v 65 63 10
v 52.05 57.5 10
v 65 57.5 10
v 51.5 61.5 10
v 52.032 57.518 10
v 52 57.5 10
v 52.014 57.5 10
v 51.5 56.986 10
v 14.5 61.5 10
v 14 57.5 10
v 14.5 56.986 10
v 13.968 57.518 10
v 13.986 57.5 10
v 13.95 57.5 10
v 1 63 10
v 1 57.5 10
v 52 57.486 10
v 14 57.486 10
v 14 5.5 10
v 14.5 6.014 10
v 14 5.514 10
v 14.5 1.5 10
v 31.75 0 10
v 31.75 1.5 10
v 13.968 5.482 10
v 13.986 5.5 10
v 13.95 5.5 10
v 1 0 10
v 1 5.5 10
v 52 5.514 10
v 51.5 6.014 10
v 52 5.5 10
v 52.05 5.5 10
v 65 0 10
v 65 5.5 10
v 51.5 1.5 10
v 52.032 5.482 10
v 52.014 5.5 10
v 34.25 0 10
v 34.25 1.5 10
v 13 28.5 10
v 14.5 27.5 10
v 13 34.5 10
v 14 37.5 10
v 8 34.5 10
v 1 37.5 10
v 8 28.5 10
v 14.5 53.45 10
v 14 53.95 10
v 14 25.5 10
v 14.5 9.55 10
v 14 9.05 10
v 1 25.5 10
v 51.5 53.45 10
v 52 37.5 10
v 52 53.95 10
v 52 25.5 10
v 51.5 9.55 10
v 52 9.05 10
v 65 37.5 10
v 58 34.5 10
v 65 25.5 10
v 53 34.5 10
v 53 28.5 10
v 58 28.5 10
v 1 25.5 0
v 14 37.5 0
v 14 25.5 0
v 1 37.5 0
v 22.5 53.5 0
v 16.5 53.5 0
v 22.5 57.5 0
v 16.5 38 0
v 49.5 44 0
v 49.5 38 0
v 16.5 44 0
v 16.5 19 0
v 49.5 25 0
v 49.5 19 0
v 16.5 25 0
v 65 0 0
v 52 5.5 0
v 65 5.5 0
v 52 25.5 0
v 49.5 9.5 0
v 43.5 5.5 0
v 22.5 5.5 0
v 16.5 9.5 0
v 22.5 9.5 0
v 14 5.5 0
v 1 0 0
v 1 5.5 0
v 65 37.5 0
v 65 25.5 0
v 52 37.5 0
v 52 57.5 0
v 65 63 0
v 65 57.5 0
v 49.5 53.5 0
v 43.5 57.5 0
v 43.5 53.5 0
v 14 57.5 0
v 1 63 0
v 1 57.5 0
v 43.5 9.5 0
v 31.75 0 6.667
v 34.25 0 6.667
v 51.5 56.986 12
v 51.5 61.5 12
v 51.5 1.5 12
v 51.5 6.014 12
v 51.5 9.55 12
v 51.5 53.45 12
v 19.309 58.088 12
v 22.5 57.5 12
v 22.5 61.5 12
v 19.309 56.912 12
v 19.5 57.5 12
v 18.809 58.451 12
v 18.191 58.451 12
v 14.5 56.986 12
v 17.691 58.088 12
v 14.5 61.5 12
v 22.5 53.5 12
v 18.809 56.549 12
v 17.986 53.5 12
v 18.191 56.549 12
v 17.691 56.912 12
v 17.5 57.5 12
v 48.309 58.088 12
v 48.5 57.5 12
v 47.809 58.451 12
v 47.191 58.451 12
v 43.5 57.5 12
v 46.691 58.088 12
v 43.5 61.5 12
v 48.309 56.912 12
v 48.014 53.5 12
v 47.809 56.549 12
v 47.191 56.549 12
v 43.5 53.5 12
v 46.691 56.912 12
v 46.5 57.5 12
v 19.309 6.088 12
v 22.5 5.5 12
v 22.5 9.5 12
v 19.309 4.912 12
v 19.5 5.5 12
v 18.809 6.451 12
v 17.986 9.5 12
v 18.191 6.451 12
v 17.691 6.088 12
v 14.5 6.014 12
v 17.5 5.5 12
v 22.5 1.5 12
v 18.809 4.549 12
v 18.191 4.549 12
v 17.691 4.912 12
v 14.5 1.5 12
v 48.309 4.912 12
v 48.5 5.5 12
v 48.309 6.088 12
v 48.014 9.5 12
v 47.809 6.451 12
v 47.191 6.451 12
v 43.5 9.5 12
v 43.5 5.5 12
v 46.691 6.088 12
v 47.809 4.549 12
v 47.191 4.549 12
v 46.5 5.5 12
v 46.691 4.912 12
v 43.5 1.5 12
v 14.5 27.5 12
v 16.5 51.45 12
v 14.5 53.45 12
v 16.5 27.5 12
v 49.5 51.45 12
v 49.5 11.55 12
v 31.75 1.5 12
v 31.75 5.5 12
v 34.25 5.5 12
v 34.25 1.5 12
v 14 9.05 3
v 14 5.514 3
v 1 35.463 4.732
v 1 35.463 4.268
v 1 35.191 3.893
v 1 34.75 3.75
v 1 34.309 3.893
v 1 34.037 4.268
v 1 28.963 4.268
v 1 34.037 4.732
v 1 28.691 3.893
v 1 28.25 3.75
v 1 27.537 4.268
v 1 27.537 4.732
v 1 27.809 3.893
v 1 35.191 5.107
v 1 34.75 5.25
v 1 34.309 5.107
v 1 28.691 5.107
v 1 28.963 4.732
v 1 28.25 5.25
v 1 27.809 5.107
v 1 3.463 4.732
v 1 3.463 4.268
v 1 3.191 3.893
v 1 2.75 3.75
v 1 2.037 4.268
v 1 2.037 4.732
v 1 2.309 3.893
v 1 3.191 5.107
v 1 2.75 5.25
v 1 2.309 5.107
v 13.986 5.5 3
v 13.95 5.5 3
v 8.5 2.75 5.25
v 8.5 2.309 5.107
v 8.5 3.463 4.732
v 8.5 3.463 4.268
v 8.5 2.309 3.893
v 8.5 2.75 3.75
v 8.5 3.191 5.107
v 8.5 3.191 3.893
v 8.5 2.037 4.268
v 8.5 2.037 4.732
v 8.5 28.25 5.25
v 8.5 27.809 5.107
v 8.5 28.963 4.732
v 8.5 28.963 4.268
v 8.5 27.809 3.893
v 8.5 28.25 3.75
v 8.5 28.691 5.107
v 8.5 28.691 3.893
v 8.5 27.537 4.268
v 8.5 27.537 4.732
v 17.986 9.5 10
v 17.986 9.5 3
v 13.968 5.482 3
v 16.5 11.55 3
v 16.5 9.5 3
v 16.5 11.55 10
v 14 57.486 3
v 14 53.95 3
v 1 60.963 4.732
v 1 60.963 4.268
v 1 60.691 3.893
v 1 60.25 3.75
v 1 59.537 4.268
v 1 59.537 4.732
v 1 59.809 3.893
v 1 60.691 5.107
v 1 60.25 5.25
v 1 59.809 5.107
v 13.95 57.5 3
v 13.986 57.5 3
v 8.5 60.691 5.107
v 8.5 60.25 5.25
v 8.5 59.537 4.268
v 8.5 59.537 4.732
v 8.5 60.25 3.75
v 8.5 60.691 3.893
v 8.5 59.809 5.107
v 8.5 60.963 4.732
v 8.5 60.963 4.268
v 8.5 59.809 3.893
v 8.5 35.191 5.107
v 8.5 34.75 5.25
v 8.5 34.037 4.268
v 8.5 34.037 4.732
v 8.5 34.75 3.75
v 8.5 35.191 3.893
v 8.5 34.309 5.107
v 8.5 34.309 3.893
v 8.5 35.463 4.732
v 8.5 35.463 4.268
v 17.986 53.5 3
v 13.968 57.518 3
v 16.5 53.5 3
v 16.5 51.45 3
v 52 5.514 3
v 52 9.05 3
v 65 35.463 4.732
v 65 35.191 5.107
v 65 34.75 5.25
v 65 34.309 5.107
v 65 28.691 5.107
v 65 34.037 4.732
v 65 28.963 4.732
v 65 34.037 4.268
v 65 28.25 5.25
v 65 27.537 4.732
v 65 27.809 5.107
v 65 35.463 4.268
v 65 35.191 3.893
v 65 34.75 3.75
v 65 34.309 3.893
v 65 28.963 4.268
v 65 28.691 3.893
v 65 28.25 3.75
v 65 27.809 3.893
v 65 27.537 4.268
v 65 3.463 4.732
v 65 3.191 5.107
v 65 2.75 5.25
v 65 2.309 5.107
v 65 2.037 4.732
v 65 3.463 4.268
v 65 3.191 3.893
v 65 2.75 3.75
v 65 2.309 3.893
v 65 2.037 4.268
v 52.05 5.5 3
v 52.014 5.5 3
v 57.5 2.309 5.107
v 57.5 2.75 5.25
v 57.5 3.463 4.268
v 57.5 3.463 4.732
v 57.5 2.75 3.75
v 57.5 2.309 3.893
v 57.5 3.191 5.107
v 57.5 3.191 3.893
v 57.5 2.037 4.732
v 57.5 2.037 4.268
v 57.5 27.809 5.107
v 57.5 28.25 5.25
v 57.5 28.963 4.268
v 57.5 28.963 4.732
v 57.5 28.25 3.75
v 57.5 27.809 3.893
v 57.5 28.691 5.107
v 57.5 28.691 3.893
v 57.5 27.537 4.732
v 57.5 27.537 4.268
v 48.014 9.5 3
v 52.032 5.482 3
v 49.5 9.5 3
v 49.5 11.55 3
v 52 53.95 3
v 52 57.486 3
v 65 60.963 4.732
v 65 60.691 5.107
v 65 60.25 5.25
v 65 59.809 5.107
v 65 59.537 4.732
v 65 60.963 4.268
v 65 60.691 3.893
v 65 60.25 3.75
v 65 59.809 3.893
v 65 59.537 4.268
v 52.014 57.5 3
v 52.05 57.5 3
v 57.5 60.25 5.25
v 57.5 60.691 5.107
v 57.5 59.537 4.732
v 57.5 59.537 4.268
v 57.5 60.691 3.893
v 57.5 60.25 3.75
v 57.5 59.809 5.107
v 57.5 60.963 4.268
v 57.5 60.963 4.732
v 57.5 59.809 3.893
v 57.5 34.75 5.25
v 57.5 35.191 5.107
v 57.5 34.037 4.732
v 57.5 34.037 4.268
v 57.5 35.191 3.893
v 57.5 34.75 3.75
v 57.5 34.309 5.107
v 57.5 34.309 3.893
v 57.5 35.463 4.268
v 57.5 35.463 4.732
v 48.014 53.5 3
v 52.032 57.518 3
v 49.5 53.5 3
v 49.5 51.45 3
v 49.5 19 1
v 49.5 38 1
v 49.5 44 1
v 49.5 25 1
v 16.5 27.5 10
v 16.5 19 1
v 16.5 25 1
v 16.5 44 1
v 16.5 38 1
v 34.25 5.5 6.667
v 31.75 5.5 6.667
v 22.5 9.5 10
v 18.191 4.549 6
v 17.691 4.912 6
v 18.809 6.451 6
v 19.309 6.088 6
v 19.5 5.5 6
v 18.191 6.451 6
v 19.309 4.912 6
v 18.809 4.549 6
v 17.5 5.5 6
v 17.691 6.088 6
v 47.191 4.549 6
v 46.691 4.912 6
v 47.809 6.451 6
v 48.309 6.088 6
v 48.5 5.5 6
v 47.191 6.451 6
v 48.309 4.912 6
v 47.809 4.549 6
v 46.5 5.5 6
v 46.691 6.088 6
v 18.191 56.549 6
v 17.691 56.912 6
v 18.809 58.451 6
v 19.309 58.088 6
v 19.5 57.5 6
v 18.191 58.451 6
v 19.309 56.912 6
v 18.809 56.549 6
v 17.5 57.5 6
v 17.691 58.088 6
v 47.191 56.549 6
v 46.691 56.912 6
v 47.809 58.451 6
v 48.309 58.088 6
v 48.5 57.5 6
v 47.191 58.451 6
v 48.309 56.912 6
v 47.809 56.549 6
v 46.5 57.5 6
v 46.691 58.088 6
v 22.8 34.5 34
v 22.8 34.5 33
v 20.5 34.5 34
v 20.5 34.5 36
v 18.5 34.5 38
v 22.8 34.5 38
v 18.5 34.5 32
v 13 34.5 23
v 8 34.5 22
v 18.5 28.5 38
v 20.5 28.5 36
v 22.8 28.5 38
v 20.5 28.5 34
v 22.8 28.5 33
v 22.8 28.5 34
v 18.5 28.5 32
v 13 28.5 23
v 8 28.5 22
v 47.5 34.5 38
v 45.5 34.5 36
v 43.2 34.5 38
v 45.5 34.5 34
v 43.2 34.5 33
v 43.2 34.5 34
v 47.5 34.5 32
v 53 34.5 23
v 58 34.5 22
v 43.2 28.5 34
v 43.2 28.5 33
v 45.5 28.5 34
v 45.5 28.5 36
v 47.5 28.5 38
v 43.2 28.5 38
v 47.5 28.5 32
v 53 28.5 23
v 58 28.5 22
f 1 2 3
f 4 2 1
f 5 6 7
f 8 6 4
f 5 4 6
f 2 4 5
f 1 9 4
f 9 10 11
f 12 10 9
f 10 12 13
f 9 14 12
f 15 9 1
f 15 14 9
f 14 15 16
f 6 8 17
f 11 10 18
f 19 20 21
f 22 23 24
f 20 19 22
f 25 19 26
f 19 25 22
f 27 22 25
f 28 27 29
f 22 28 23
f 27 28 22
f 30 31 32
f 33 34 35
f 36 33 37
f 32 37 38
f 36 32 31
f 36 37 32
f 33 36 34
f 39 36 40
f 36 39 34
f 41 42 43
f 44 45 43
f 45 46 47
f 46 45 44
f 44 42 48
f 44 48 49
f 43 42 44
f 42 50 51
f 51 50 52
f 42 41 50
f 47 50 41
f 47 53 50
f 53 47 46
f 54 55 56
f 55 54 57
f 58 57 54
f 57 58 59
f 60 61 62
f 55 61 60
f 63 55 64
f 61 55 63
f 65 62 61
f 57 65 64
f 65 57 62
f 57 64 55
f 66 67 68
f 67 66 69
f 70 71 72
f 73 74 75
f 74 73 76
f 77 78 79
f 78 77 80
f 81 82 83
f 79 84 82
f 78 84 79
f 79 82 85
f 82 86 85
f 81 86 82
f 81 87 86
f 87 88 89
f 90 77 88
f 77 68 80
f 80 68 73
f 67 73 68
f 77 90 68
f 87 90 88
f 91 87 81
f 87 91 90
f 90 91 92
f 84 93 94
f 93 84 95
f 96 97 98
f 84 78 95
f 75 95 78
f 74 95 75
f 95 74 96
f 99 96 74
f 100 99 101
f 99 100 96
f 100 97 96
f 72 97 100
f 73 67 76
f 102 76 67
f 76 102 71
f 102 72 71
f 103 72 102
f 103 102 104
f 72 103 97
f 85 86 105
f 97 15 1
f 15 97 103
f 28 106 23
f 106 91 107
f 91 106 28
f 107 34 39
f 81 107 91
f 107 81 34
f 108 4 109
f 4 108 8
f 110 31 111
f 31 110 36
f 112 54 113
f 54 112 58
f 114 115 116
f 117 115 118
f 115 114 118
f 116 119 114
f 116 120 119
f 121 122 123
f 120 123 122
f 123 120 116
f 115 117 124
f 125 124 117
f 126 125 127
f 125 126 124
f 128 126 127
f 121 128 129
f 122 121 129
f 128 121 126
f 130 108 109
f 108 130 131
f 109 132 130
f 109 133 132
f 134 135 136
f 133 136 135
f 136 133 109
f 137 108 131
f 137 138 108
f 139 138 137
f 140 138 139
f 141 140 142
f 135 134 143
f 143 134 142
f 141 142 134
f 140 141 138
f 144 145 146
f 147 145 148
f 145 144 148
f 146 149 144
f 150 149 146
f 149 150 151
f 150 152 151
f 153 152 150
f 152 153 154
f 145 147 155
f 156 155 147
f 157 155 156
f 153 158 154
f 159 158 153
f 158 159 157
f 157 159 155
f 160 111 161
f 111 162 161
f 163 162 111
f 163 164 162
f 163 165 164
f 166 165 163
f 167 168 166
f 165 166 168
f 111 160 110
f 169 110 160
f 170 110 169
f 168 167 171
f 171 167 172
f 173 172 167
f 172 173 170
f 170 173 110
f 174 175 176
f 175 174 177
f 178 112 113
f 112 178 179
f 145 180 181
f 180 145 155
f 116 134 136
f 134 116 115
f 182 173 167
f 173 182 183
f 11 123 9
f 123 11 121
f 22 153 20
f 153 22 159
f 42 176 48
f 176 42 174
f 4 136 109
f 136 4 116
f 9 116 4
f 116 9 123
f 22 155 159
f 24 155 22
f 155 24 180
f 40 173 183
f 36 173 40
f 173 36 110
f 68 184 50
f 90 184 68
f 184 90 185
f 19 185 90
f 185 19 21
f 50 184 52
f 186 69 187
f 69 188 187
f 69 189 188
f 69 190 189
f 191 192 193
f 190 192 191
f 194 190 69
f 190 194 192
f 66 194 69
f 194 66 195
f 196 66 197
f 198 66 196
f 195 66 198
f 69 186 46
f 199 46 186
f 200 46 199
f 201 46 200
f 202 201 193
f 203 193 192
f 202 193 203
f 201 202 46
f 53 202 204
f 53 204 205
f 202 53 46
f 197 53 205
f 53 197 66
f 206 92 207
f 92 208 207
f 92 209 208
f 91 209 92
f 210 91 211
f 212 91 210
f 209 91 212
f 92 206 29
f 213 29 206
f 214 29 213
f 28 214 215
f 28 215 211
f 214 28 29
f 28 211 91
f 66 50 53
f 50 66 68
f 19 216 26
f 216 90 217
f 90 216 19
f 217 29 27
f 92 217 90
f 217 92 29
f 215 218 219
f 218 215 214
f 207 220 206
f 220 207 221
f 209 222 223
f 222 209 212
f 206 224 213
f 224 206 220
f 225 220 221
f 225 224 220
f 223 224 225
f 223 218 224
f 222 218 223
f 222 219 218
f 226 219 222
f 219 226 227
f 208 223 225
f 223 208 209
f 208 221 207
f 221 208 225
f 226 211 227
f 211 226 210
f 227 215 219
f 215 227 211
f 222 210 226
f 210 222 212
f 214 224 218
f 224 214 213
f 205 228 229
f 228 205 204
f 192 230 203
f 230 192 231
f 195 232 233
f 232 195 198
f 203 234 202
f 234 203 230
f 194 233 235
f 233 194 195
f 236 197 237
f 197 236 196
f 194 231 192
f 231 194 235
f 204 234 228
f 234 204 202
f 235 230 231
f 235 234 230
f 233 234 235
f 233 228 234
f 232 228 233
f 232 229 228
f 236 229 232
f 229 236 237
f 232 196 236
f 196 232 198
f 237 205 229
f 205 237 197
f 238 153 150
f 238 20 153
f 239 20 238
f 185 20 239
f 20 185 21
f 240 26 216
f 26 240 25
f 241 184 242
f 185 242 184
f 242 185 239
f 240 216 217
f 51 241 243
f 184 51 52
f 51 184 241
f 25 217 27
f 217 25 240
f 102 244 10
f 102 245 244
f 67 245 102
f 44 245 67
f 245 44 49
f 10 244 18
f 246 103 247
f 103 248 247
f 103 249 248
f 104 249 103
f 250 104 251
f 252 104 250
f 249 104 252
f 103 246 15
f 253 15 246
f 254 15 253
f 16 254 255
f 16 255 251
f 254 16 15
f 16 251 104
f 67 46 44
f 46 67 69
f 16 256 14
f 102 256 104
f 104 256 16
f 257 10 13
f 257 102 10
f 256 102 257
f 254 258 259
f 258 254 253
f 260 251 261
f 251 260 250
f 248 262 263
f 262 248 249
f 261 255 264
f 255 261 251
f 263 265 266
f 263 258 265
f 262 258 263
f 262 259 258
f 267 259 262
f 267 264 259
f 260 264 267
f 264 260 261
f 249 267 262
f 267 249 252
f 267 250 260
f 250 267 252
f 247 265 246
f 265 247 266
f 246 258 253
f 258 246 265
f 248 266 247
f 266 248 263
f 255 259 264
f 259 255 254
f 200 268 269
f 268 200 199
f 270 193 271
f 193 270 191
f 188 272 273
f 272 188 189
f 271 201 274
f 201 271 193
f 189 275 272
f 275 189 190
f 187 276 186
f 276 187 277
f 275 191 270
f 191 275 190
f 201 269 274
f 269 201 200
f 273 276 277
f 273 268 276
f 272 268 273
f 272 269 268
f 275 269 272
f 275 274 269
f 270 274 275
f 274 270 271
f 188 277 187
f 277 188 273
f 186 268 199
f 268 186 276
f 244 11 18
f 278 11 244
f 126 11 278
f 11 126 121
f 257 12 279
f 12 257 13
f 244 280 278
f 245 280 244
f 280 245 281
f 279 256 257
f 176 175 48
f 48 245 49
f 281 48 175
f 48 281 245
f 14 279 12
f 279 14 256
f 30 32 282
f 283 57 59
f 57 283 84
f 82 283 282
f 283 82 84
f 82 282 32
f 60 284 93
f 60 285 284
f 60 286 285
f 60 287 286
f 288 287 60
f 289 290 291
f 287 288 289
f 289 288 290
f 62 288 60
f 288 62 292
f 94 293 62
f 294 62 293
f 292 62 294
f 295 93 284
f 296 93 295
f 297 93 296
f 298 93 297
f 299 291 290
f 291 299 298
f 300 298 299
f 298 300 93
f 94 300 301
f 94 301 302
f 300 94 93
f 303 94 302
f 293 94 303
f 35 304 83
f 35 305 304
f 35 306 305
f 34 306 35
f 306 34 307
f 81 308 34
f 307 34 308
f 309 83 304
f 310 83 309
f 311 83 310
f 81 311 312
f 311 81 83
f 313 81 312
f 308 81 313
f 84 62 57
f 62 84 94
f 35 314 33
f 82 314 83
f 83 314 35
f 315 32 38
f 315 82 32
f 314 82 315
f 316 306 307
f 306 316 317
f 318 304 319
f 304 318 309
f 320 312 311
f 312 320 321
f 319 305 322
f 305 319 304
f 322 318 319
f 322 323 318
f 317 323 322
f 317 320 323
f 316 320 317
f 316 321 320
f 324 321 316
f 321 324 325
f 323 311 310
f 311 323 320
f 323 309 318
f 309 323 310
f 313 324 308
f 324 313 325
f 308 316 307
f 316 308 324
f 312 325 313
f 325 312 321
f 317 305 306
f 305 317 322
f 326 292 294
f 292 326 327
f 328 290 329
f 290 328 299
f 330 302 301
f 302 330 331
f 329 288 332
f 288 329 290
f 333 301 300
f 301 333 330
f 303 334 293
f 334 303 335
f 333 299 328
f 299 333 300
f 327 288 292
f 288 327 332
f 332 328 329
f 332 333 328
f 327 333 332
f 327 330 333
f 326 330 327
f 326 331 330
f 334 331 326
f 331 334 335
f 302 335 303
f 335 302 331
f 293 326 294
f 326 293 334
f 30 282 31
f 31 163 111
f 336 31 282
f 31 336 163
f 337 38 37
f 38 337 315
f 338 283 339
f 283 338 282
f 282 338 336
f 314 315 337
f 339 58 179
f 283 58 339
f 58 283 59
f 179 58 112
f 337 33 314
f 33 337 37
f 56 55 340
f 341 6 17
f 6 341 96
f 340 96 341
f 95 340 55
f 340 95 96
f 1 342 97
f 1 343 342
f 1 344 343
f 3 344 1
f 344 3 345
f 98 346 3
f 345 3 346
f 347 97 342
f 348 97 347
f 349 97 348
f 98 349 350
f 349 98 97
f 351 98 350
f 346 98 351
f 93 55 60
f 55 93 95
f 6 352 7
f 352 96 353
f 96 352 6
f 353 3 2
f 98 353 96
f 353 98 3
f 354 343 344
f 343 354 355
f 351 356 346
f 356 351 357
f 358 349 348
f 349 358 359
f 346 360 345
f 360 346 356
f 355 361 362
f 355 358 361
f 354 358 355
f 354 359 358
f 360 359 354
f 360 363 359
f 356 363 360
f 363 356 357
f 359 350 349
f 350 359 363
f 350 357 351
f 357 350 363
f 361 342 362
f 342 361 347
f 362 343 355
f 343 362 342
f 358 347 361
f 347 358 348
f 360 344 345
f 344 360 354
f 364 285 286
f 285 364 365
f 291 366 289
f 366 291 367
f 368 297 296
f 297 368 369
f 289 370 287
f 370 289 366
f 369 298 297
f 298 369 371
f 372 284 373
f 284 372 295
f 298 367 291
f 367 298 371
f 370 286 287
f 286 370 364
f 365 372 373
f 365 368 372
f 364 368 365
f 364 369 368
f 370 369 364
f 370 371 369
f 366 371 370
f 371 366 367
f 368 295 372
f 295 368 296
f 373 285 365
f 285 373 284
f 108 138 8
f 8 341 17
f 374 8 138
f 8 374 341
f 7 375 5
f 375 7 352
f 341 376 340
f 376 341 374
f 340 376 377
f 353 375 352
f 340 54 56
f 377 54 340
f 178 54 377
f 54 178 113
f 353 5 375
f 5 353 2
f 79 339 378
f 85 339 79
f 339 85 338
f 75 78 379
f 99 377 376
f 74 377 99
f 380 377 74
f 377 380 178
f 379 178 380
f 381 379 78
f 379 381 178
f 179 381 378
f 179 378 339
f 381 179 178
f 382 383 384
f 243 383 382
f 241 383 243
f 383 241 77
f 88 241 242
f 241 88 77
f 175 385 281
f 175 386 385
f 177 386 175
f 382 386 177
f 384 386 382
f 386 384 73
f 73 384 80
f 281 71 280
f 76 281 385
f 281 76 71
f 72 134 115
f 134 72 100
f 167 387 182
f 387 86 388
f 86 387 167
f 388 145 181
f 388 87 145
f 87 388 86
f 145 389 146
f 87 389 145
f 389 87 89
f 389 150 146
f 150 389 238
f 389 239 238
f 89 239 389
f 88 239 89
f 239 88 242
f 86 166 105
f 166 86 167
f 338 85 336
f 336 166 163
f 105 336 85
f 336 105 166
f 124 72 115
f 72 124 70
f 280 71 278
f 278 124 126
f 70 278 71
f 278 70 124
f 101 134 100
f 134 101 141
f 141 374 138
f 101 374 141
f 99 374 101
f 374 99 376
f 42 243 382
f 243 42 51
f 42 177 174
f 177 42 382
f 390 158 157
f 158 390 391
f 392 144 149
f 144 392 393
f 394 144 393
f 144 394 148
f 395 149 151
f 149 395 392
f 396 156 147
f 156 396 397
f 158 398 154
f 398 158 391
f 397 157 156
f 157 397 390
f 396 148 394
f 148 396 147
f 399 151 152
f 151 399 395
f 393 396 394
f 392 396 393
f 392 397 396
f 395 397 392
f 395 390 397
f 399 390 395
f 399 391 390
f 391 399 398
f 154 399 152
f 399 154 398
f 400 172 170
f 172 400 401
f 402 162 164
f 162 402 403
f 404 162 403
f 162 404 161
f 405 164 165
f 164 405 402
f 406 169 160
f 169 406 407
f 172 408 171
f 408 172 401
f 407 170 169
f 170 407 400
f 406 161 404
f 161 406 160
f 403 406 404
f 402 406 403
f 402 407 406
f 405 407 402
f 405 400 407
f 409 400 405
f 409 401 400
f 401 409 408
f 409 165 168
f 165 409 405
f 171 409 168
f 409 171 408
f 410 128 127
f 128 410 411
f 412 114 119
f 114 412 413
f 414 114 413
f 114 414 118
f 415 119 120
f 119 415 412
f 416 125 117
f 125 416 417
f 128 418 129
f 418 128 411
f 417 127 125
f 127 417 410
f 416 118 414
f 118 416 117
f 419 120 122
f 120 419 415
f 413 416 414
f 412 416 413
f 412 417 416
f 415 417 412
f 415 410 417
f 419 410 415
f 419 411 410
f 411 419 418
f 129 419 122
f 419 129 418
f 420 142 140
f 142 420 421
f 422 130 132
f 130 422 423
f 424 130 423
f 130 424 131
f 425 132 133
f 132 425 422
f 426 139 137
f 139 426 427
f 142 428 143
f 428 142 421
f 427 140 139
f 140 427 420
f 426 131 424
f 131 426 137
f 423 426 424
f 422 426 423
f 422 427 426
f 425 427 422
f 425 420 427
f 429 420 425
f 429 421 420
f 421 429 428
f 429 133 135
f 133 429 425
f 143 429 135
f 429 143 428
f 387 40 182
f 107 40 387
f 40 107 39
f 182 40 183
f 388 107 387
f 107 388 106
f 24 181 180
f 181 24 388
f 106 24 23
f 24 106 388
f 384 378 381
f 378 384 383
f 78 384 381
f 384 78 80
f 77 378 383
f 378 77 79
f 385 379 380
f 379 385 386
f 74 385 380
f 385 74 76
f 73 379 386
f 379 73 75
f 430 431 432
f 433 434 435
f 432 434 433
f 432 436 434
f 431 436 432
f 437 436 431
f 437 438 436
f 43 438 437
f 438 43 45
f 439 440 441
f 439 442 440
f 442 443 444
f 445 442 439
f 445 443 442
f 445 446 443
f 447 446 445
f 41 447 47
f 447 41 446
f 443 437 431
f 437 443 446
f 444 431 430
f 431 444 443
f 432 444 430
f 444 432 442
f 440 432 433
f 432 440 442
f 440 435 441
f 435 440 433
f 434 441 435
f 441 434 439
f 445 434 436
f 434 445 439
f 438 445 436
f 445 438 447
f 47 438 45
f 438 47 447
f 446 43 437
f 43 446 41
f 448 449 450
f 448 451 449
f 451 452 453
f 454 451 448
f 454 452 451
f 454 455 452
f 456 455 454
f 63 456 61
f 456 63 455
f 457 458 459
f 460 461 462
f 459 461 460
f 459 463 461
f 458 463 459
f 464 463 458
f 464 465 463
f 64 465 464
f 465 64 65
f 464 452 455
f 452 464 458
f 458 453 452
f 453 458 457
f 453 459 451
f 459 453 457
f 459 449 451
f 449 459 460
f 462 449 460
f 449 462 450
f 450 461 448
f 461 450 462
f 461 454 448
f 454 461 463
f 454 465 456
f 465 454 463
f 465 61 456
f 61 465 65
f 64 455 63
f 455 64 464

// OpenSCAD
    // frame for short four-legged robot
    // History:
    // v1: Fusion360, check 01_trivial dir
    // v2: openscad:
    //     - inverted servos support
    //     - solid holder for IMU unit

    // servo motor GH-S37A
    SERVO_WIDTH = 13;
    SERVO_LENGTH = 20;
    SERVO_THICK = 9;
    SERVO_EARS_LENGTH = 5.5;
    SERVO_EARS_THICK = 1;
    SERVO_HOLE_LENGTH = 7.5;
    SERVO_HOLE_D = 1.5;
    SERVO_WIRE_THICK = 2.5;
    SERVO_WIRE_LENGTH = 10;

    module servo(up_extrude = 1) {
        cube([SERVO_WIDTH, SERVO_LENGTH, SERVO_THICK*up_extrude]);
        translate([-SERVO_EARS_THICK, -SERVO_EARS_LENGTH, 0])
        cube([SERVO_EARS_THICK, (SERVO_EARS_LENGTH+0.5)*2 + SERVO_LENGTH, SERVO_THICK*up_extrude]);

        translate([-SERVO_EARS_THICK*2, -(SERVO_EARS_LENGTH)/2, SERVO_THICK/2])
        rotate([0, 90, 0])
        cylinder(SERVO_HOLE_LENGTH + SERVO_EARS_THICK*2, d=SERVO_HOLE_D, $fn=10);

        translate([-SERVO_EARS_THICK*2, SERVO_LENGTH + SERVO_EARS_LENGTH/2, SERVO_THICK/2])
        rotate([0, 90, 0])
        cylinder(SERVO_HOLE_LENGTH + SERVO_EARS_THICK*2, d=SERVO_HOLE_D, $fn=10);

        // cable
        translate([SERVO_WIDTH-SERVO_WIRE_THICK+0.7, SERVO_WIRE_THICK/2+.5, SERVO_THICK/3])
        rotate([0, 0, -45])
        cube([SERVO_WIRE_THICK, SERVO_WIRE_LENGTH, SERVO_THICK*2]);
    }


    BOARD_LENGTH = 60;
    BOARD_WIDTH = 37;
    BOARD_THICK = 2;
    BOARD_HOLE_D = 2;
    BOARD_HOLE_OFS = 4;
    BOARD_HOLE_LENGTH = 10;
    BOARD_HOLE_BASE = 8;

    BOARD_DOWN_LENGTH = 52;
    BOARD_DOWN_WIDTH = 33;
    BOARD_DOWN_DEPTH = 17;

    BOARD_SD_WIDTH = 15;
    BOARD_SD_LENGTH = 18;
    BOARD_SD_THICK = 3;
    BOARD_SD_Y_OFS = 8;

    module board(up_extrude = 1) {
        difference() {
            union() {
                cube([BOARD_WIDTH, BOARD_LENGTH, BOARD_THICK*up_extrude]);
                translate([(BOARD_WIDTH - BOARD_DOWN_WIDTH)/2,
                    (BOARD_LENGTH - BOARD_DOWN_LENGTH)/2, -BOARD_DOWN_DEPTH])
                cube([BOARD_DOWN_WIDTH, BOARD_DOWN_LENGTH, BOARD_DOWN_DEPTH]);
            }

            translate([0, 0, -BOARD_DOWN_DEPTH]) {
                cube([BOARD_HOLE_BASE, BOARD_HOLE_BASE, BOARD_DOWN_DEPTH]);

                translate([BOARD_WIDTH - BOARD_HOLE_BASE, 0, 0])
                cube([BOARD_HOLE_BASE, BOARD_HOLE_BASE, BOARD_DOWN_DEPTH]);

                translate([0, BOARD_LENGTH - BOARD_HOLE_BASE, 0])
                cube([BOARD_HOLE_BASE, BOARD_HOLE_BASE, BOARD_DOWN_DEPTH]);

                translate([BOARD_WIDTH - BOARD_HOLE_BASE, BOARD_LENGTH - BOARD_HOLE_BASE, 0])
                cube([BOARD_HOLE_BASE, BOARD_HOLE_BASE, BOARD_DOWN_DEPTH]);
            }
        }

        translate([0, BOARD_SD_Y_OFS, -BOARD_THICK])
        cube([BOARD_SD_WIDTH, BOARD_SD_LENGTH, BOARD_SD_THICK]);

        translate([BOARD_HOLE_OFS, BOARD_HOLE_OFS, -BOARD_HOLE_LENGTH+BOARD_THICK*2])
        cylinder(BOARD_HOLE_LENGTH, d=BOARD_HOLE_D, $fn=10);

        translate([BOARD_WIDTH-BOARD_HOLE_OFS, BOARD_HOLE_OFS, -BOARD_HOLE_LENGTH+BOARD_THICK*2])
        cylinder(BOARD_HOLE_LENGTH, d=BOARD_HOLE_D, $fn=10);

        translate([BOARD_HOLE_OFS, BOARD_LENGTH-BOARD_HOLE_OFS, -BOARD_HOLE_LENGTH+BOARD_THICK*2])
        cylinder(BOARD_HOLE_LENGTH, d=BOARD_HOLE_D, $fn=10);

        translate([BOARD_WIDTH-BOARD_HOLE_OFS, BOARD_LENGTH-BOARD_HOLE_OFS, -BOARD_HOLE_LENGTH+BOARD_THICK*2])
        cylinder(BOARD_HOLE_LENGTH, d=BOARD_HOLE_D, $fn=10);
    }



    // Frame base with servo and board placement
    BASE_LENGTH = 63;
    BASE_WIDTH = 66;
    BASE_THICK = 10;
    BASE_UNDER_SERVO_DIM = 0;
    BASE_BOARD_Z_OFS = BASE_THICK + 2;

    BASE_WIRE_LENGTH = 6;
    BASE_WIRE_THICK = 1;


    module frame_base() {
        board_ofs_x = (BASE_WIDTH - BOARD_WIDTH)/2;
        board_ofs_y = (BASE_LENGTH - BOARD_LENGTH)/2;

        difference() {
            union() {
                cube([BASE_WIDTH, BASE_LENGTH, BASE_THICK]);
                translate([board_ofs_x, board_ofs_y, 0])
                cube([BOARD_WIDTH, BOARD_LENGTH, BASE_BOARD_Z_OFS]);
            }

            translate([SERVO_EARS_THICK, SERVO_EARS_LENGTH, BASE_UNDER_SERVO_DIM])
            servo(up_extrude=3);

            translate([SERVO_EARS_THICK, BASE_LENGTH-SERVO_EARS_LENGTH, BASE_UNDER_SERVO_DIM])
            mirror([0, 1, 0])
            servo(up_extrude=3);

            translate([BASE_WIDTH, 0, 0])
            mirror([1, 0, 0]) {
                translate([SERVO_EARS_THICK, SERVO_EARS_LENGTH, BASE_UNDER_SERVO_DIM])
                servo(up_extrude=3);
                mirror([0, 1, 0])
                translate([SERVO_EARS_THICK, -BASE_LENGTH+SERVO_EARS_LENGTH, BASE_UNDER_SERVO_DIM])
                servo(up_extrude=3);
            }

            // board
            translate([board_ofs_x, board_ofs_y, BASE_BOARD_Z_OFS])
            board(1);

            // wire hole
            translate([(BASE_WIDTH - SERVO_WIRE_THICK)/2, -1, BASE_THICK*2/3])
            cube([SERVO_WIRE_THICK, 10, BASE_THICK]);
        }

        // wire supports
        translate([board_ofs_x, (BASE_LENGTH-BASE_WIRE_LENGTH)/3, 0])
        cube([BOARD_WIDTH, BASE_WIRE_LENGTH, BASE_WIRE_THICK]);

        translate([board_ofs_x, (BASE_LENGTH-BASE_WIRE_LENGTH)*2/3, 0])
        cube([BOARD_WIDTH, BASE_WIRE_LENGTH, BASE_WIRE_THICK]);
    }


    module imu_holder(thickness) {
        // grip offsets
        y = 5;
        x = 1.5;
        linear_extrude(thickness)
        translate([5, 14])
        polygon([
            [1, -2],
            [1, -14], [6, -14],
            [6, -1], [17.3-x, 14-y], [17.3-x, 15-y], [15-x, 15-y],
            [15-x, 17-y], [17.3-x, 19-y], [13-x, 19-y], [13-x, 13-y]
        ]);
    }


    FRAME_IMU_THICK = 6;
    FRAME_IMU_X_OFS = 2;


    module frame() {
        frame_base();

        imu_y_ofs = (BASE_LENGTH + FRAME_IMU_THICK)/2;

        translate([FRAME_IMU_X_OFS, imu_y_ofs, BASE_THICK])
        rotate([90, 0, 0])
        imu_holder(FRAME_IMU_THICK);

        translate([BASE_WIDTH - FRAME_IMU_X_OFS, imu_y_ofs, BASE_THICK])
        mirror([1, 0, 0])
        rotate([90, 0, 0])
        imu_holder(FRAME_IMU_THICK);
    }


    IMU_WIDTH = 25.4;
    IMU_LENGTH = 25.6;
    IMU_THICK = 1.7;

    module imu_board() {
        x_ofs = (BASE_WIDTH - IMU_WIDTH)/2;
        y_ofs = (BASE_LENGTH - IMU_LENGTH)/2;

        translate([x_ofs, y_ofs, 34])
        cube([IMU_WIDTH, IMU_LENGTH, IMU_THICK]);
    }


    //frame_base();
    //imu_holder(FRAME_IMU_THICK);
    //board();
    //servo();
    frame();

    //imu_board();
